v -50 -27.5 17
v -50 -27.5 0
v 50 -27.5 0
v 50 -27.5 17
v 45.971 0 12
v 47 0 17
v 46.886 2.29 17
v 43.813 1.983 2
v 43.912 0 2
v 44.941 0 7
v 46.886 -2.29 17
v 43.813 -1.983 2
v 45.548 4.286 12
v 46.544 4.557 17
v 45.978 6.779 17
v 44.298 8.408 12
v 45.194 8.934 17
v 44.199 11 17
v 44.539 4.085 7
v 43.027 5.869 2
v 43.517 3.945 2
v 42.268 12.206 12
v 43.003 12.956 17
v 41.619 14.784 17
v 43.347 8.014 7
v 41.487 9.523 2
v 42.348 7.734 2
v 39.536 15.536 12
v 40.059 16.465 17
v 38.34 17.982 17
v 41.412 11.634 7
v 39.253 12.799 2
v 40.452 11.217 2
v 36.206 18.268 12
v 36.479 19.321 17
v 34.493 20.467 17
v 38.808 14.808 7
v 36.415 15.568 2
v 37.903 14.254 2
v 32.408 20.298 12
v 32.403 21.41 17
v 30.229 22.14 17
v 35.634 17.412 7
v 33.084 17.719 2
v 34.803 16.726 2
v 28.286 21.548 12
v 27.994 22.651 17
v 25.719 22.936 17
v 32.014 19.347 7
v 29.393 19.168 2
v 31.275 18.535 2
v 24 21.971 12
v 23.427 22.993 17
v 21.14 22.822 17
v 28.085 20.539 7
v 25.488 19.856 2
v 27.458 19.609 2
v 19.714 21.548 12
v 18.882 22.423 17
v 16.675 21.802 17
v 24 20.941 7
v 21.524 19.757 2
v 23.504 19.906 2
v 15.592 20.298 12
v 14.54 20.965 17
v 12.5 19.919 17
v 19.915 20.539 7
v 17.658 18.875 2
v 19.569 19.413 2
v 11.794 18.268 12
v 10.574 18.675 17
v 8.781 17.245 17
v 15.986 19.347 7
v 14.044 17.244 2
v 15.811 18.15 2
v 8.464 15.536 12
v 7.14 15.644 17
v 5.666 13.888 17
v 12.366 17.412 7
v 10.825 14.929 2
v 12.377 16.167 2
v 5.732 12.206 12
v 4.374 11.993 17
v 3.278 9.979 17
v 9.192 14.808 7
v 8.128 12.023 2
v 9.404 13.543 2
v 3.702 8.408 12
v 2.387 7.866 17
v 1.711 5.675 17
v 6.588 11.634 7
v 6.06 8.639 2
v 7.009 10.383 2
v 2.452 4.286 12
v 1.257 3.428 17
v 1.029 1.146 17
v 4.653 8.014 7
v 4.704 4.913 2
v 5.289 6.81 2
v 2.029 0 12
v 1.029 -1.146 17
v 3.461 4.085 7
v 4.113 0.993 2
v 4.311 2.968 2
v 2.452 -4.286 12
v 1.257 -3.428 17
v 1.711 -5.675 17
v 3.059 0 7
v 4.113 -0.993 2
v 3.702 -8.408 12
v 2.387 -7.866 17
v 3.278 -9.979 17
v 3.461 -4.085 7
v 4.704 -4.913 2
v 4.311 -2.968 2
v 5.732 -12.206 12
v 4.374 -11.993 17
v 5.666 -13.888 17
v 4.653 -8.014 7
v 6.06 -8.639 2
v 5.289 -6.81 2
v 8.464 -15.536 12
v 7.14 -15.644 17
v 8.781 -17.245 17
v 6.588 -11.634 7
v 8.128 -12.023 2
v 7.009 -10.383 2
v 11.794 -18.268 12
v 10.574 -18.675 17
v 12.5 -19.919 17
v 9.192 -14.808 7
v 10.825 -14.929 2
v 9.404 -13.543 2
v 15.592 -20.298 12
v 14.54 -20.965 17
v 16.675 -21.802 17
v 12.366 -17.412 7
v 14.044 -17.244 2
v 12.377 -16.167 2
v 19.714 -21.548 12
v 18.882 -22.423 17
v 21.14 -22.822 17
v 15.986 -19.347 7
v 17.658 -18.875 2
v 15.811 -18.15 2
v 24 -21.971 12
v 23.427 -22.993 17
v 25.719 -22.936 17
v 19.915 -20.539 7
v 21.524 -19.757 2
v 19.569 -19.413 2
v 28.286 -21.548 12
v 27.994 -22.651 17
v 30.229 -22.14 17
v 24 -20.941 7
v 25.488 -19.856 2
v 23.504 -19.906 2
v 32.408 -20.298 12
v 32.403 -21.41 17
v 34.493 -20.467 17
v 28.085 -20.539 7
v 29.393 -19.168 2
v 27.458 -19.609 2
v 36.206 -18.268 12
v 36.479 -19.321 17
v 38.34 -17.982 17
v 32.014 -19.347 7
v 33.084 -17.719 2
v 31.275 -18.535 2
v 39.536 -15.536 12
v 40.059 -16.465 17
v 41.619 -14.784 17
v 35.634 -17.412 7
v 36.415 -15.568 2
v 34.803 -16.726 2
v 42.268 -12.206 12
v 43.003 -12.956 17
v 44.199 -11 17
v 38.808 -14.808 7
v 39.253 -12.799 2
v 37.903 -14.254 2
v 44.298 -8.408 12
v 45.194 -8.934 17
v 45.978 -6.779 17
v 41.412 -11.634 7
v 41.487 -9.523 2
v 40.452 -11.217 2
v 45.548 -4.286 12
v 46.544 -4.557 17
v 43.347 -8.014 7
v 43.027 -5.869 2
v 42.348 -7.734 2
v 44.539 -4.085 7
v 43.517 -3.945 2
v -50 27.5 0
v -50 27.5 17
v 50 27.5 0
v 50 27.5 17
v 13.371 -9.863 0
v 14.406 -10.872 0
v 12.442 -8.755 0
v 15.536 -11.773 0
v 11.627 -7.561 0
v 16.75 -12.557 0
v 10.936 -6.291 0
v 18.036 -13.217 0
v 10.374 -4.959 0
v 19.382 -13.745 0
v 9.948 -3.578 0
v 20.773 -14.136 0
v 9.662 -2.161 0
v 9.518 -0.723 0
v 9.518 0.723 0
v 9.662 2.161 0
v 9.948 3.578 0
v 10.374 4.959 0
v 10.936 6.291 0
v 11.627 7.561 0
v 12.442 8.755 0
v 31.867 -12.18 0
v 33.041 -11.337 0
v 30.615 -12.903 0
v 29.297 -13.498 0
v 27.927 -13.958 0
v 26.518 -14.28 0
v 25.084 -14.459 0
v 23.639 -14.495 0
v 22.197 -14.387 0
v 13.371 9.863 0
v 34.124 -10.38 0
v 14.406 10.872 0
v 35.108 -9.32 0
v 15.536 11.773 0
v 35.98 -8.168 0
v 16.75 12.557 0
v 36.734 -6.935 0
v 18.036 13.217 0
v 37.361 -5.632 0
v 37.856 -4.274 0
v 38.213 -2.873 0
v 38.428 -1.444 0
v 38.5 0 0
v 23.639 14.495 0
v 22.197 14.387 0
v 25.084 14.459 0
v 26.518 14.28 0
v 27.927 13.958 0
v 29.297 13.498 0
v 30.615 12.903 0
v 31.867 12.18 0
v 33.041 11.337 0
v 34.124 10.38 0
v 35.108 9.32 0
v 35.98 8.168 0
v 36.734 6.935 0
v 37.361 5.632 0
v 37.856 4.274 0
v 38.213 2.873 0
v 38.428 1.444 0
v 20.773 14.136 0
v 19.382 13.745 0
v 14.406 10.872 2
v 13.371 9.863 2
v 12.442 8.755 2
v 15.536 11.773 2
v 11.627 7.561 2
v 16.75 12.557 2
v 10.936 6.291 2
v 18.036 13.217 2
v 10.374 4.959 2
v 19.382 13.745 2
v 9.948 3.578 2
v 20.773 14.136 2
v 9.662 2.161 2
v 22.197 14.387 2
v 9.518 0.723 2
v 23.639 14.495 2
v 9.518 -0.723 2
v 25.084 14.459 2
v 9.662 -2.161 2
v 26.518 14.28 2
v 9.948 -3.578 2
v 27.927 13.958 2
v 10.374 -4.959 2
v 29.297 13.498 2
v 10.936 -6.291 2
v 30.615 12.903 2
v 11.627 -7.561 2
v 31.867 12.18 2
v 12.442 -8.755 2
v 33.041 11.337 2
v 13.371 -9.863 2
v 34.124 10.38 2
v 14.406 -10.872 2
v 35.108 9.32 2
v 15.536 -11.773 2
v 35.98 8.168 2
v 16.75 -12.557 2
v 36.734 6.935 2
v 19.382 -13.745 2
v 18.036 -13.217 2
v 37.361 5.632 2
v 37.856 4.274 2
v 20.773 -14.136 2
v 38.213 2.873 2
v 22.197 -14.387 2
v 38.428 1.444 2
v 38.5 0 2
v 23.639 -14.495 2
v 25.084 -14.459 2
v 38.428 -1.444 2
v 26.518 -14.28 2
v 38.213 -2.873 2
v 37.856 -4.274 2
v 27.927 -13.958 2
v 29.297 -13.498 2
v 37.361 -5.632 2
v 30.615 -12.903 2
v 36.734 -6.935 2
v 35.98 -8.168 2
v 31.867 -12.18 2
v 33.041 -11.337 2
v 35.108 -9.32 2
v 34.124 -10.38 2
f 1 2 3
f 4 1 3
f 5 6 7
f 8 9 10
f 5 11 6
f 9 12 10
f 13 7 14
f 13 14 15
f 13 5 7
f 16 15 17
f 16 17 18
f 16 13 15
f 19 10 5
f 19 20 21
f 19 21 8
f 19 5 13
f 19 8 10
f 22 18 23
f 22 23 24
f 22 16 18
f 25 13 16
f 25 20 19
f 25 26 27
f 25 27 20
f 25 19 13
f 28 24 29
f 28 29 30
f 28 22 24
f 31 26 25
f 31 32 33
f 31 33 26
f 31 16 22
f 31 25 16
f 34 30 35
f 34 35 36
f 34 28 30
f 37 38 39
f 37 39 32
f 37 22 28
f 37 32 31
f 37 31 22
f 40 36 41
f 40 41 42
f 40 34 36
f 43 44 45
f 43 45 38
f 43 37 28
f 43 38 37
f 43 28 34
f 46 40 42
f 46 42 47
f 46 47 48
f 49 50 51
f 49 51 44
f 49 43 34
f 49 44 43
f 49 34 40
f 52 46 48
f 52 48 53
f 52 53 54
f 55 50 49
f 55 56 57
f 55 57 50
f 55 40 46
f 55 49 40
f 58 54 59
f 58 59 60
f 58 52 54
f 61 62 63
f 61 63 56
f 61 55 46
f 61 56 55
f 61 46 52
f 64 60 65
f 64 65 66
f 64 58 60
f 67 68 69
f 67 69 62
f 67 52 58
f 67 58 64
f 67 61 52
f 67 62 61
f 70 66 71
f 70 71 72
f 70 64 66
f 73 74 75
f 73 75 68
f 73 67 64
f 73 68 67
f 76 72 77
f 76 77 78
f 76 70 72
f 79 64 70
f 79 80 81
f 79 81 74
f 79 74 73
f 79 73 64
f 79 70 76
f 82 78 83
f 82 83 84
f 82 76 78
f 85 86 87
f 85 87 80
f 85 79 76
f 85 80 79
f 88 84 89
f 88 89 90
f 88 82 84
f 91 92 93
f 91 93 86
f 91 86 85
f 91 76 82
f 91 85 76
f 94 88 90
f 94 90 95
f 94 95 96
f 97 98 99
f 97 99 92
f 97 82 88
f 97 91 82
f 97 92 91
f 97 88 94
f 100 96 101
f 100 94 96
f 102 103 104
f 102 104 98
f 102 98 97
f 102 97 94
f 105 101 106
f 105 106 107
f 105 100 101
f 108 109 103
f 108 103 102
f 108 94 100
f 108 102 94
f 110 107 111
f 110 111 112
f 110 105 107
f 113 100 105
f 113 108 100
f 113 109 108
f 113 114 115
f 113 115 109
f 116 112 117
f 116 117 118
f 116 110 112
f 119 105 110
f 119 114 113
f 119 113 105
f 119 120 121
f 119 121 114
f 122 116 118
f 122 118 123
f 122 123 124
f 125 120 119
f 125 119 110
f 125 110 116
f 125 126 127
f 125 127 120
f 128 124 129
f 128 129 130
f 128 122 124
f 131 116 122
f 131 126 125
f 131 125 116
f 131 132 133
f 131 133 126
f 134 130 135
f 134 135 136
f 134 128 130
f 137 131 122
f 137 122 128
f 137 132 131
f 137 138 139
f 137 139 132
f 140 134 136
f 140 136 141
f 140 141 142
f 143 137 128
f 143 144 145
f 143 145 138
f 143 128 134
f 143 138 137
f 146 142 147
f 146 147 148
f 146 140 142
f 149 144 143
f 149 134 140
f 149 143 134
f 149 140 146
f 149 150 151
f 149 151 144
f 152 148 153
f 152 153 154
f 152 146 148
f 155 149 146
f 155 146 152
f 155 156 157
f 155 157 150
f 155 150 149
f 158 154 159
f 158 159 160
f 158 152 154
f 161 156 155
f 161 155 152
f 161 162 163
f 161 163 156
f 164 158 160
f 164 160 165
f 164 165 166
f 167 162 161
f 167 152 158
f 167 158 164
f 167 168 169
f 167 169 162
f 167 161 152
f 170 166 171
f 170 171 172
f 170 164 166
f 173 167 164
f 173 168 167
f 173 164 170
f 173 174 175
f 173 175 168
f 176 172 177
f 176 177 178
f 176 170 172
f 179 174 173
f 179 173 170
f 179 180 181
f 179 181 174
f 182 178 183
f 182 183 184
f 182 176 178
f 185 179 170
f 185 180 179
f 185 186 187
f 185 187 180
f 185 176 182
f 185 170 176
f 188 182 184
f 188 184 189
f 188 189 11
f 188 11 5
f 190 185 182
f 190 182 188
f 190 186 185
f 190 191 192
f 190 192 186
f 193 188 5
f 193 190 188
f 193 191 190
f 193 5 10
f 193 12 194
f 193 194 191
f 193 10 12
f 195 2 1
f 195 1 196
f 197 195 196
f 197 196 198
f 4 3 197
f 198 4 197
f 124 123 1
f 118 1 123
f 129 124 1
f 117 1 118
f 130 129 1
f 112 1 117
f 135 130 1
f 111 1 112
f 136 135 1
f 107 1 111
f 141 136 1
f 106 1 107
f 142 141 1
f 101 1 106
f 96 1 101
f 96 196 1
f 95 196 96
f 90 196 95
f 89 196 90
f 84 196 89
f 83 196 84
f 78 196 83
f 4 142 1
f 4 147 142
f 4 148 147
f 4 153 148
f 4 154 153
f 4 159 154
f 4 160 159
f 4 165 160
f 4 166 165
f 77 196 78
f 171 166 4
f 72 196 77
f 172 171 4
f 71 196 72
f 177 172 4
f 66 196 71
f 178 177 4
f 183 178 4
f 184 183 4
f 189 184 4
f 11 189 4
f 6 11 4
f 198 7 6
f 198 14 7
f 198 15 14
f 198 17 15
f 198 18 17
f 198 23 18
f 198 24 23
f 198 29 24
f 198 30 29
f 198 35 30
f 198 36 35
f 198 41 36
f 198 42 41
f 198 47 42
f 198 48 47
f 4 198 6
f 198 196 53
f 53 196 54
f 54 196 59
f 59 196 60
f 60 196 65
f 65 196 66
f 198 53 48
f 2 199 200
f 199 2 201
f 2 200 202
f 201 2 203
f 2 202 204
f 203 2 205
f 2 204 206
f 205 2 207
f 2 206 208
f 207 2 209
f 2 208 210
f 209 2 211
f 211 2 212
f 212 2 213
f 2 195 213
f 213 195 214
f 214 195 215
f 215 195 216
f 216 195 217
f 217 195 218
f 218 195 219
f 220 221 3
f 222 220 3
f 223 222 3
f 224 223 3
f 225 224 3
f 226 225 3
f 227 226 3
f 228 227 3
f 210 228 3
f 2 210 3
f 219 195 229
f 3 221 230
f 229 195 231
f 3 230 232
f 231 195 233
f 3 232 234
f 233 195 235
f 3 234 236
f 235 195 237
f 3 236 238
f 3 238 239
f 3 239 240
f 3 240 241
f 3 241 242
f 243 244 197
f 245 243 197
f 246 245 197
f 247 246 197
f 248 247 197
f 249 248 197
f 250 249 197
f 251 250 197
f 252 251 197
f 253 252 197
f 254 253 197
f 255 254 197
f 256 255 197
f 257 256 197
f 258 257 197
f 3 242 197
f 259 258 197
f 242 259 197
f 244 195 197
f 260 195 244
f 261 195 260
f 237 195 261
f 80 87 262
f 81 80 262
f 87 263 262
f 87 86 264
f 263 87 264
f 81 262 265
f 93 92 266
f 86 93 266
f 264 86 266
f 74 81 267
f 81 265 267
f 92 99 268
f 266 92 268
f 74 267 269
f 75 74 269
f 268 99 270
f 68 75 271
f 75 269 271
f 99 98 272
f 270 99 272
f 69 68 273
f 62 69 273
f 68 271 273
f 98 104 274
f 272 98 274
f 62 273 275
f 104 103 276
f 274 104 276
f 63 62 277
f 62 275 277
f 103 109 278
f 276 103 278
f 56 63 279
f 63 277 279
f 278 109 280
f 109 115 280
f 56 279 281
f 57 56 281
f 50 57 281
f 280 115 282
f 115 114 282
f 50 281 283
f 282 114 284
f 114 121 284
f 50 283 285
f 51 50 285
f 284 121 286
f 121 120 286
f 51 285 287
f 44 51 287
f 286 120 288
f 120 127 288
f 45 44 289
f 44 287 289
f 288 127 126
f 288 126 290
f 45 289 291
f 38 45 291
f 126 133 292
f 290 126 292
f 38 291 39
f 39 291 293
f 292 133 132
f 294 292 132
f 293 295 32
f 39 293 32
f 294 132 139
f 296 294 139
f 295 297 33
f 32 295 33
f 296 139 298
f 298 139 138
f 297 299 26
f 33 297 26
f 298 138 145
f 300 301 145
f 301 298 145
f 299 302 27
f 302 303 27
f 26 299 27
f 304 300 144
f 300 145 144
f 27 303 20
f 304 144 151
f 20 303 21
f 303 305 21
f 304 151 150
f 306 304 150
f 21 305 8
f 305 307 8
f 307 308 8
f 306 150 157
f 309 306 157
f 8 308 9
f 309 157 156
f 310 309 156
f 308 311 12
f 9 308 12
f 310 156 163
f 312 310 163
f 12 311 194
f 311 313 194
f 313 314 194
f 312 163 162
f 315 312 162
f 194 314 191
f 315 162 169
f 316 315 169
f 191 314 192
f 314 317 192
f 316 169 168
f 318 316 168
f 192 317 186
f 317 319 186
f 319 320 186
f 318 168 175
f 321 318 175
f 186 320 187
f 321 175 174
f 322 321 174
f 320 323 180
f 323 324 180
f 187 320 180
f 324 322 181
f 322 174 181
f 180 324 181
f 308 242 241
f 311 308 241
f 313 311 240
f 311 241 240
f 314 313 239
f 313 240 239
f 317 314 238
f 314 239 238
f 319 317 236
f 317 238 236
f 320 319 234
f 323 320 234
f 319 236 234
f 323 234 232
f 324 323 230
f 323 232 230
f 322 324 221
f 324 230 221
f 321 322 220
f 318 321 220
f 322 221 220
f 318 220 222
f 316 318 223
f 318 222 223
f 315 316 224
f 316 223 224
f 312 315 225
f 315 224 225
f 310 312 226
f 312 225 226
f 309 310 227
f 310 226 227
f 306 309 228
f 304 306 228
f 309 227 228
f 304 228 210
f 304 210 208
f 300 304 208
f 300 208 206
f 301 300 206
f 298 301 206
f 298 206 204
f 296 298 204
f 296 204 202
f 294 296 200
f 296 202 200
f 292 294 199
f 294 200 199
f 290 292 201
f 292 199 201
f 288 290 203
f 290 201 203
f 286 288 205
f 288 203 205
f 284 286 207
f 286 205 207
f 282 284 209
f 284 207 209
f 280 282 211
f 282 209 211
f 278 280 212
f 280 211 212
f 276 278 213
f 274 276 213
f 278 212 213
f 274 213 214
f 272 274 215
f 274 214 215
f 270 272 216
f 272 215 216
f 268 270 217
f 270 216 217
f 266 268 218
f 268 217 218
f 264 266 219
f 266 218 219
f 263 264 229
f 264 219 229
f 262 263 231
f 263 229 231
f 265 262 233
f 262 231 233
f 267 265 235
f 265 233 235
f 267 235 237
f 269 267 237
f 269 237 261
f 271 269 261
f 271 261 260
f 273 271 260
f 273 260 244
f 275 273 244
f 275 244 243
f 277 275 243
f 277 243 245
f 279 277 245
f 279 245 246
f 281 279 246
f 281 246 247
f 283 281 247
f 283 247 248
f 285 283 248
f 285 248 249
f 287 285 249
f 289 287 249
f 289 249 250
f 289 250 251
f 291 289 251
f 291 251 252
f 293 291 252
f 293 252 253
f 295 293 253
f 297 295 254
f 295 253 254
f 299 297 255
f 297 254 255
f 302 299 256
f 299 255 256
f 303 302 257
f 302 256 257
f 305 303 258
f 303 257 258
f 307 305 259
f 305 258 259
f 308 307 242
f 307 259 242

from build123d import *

# Parameters (mm, degrees)
F0_W     = 100
F0_H     = 55
F1_DEPTH = 17
F3_R     = 23
F2_R     = 19.5
F5_R     = 14.5
F5_R_2   = 20.5
F6_DEPTH = 2


with BuildPart() as f1:
    # F0 (on Top) → F1 (new body)
    with BuildSketch(Plane.XY):
        Rectangle(F0_W, F0_H)
    extrude(amount=F1_DEPTH)

    # F3 (on face) → F4 section 0
    with BuildSketch(Plane.XY.offset(17)):
        with Locations((24, 0)):
            Circle(F3_R)
    # F2 (on face) → F4 section 1
    with BuildSketch(Plane(origin=(0, 0, 0), x_dir=(1, 0, 0), z_dir=(0, 0, -1))):
        with Locations((24, 0)):
            Circle(F2_R)
    loft(mode=Mode.SUBTRACT)

    # F5 (on face) → F6 (join)
    with BuildSketch(Plane(origin=(0, 0, 0), x_dir=(1, 0, 0), z_dir=(0, 0, -1))):
        with Locations((24, 0)):
            Circle(F5_R)
        with Locations((24, 0)):
            Circle(F5_R_2)
        with Locations((24, 0)):
            Circle(F5_R, mode=Mode.SUBTRACT)
    extrude(amount=-F6_DEPTH)


solid = f1.part
